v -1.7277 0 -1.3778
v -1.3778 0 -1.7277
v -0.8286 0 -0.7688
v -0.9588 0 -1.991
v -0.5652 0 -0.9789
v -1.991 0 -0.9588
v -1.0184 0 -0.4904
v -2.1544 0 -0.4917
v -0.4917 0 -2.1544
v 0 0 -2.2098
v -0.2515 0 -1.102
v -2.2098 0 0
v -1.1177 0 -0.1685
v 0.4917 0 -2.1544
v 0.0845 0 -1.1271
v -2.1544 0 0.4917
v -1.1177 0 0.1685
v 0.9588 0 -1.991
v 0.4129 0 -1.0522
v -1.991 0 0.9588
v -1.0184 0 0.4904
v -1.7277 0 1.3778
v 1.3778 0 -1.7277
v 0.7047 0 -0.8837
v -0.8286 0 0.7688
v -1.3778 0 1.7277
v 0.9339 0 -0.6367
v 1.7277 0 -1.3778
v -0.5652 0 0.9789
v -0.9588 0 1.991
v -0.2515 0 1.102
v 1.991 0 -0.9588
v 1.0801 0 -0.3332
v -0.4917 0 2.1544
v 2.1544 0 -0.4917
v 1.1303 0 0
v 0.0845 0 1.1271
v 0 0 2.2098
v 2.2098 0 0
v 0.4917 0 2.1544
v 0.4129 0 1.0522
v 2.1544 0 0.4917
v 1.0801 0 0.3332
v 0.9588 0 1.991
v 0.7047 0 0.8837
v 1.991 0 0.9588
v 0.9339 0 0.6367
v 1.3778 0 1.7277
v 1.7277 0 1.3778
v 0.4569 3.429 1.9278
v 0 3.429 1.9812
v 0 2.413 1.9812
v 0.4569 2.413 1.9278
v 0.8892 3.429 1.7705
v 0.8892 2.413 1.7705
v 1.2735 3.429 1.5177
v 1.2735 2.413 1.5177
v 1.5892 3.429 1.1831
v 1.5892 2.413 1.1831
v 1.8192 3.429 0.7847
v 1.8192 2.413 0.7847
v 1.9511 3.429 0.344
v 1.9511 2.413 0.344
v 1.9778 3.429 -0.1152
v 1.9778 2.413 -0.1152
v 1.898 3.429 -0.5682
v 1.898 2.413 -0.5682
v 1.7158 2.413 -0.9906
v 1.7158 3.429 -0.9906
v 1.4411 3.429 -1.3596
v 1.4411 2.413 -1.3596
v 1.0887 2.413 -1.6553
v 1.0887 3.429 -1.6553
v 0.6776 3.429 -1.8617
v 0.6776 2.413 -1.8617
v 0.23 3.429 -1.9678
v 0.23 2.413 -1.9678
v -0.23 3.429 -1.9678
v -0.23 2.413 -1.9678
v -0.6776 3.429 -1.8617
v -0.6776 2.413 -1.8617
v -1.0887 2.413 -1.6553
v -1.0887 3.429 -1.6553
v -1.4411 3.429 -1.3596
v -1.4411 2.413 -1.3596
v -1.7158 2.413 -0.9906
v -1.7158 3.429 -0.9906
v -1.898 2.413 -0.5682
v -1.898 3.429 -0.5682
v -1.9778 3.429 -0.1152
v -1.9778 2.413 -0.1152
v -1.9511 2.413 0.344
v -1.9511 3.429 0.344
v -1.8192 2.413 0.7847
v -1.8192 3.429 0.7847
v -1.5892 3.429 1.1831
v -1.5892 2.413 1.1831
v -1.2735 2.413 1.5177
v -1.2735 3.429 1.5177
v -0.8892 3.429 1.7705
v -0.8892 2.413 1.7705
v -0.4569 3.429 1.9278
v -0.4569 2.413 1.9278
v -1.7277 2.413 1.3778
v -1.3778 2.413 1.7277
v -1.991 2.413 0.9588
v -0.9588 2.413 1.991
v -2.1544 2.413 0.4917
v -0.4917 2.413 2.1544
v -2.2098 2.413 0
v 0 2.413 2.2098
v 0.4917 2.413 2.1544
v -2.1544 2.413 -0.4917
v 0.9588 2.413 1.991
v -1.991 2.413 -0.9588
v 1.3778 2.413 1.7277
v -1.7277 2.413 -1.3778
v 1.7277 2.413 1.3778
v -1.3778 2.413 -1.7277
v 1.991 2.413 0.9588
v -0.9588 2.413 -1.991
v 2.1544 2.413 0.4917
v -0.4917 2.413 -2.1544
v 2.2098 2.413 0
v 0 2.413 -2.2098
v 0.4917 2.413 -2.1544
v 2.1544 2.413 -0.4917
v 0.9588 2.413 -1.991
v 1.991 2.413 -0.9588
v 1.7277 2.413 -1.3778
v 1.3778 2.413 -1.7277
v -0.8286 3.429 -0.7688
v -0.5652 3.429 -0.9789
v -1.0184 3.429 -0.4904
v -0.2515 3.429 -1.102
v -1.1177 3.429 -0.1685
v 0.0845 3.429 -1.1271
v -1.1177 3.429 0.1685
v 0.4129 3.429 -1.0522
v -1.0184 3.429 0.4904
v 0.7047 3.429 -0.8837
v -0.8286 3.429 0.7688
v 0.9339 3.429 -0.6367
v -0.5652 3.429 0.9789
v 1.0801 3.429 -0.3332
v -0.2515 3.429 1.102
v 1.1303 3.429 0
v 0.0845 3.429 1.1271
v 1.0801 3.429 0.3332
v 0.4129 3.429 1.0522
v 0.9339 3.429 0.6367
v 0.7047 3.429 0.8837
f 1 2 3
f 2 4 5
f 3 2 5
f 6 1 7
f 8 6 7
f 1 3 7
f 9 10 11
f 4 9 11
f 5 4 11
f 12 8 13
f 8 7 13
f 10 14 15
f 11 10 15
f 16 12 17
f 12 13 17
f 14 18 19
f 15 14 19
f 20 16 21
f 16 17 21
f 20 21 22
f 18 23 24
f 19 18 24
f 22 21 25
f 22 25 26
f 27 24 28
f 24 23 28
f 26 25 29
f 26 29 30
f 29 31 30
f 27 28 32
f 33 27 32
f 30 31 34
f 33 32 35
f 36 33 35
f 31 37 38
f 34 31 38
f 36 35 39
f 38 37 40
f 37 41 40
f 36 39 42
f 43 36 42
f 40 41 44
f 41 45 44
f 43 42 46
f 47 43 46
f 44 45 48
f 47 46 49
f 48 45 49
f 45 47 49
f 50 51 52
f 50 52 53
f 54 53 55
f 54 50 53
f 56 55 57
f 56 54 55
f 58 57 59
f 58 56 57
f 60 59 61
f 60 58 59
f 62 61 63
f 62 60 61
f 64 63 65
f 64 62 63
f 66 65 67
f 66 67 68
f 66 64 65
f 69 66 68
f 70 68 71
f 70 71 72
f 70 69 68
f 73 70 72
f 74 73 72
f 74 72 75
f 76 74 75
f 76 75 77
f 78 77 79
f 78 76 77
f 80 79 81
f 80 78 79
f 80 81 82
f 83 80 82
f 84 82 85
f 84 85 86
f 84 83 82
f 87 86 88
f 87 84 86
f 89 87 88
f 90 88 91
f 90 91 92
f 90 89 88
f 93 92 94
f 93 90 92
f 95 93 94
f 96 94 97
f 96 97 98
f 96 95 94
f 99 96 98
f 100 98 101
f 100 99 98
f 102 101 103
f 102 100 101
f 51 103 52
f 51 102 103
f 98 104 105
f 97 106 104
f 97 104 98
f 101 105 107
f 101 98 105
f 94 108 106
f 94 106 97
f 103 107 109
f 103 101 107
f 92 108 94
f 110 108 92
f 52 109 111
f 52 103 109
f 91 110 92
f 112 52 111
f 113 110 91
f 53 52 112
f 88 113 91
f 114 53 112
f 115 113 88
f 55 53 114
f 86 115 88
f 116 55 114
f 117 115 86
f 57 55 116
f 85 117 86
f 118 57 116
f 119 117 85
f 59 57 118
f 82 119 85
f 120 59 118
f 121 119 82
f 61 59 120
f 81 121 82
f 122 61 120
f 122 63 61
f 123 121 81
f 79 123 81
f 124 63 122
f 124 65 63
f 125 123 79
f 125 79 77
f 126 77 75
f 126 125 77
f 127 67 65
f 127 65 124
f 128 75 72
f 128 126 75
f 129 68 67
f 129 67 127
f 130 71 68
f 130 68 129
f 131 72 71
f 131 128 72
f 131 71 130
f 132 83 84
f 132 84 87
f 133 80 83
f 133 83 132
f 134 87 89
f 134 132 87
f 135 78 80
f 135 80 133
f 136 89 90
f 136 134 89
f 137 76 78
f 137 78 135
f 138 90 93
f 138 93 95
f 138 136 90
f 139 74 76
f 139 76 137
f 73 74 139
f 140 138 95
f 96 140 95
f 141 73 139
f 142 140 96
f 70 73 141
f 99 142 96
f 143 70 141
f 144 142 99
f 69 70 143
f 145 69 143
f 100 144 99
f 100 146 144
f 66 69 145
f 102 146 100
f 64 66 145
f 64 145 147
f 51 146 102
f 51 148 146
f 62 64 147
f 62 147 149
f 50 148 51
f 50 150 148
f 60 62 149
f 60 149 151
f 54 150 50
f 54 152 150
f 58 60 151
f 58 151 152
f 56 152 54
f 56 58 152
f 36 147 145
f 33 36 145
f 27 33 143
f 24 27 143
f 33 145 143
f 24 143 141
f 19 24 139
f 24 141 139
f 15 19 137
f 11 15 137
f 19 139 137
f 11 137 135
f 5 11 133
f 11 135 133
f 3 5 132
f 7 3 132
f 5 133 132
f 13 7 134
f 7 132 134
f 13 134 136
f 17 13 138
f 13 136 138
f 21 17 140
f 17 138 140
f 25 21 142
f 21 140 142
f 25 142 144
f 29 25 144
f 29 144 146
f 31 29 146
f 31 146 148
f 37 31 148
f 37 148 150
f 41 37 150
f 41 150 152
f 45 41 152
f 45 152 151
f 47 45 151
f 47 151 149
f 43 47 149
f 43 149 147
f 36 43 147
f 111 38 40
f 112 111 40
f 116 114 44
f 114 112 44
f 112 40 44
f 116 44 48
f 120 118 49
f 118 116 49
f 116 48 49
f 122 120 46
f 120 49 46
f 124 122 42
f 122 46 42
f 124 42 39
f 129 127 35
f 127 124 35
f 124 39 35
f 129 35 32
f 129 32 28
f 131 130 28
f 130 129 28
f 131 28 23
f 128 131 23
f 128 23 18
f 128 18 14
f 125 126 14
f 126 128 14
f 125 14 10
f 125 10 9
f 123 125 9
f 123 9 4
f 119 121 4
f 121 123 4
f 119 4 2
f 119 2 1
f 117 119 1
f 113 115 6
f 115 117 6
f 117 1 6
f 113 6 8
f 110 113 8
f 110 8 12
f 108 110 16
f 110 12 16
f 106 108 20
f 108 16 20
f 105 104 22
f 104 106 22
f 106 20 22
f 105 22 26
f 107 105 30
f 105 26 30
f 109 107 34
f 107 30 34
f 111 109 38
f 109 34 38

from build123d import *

# Parameters (mm, degrees)
SKETCH1_R                 = 2.2098
BOSS_EXTRUDE1_DEPTH       = 3.429
SKETCH2_OUTSIDE_W         = 7.846
SKETCH2_OUTSIDE_H         = 7.846
SKETCH2_OUTSIDE_R         = 1.9812
CUT_EXTRUDE1_DEPTH        = 1.016
F_4_40_TAPPED_HOLE1_D     = 2.2606
F_4_40_TAPPED_HOLE1_DEPTH = 8.8646
F_4_40_TAPPED_HOLE1_TIP   = 0.679152758


with BuildPart() as part:
    # Sketch1 → Boss-Extrude1 (new body)
    with BuildSketch(Plane(origin=(0, 0, 0), x_dir=(1, 0, 0), z_dir=(0, 1, 0))):
        with Locations(Location((0, 0, 0), (0, 0, 270))):
            Circle(SKETCH1_R)
    extrude(amount=BOSS_EXTRUDE1_DEPTH)

    # Sketch2 outside → Cut-Extrude1 (cut)
    with BuildSketch(Plane(origin=(0, 3.429, 0), x_dir=(1, 0, 0), z_dir=(0, 1, 0))):
        Rectangle(SKETCH2_OUTSIDE_W, SKETCH2_OUTSIDE_H)
        with Locations(Location((0, 0, 0), (0, 0, 270))):
            Circle(SKETCH2_OUTSIDE_R, mode=Mode.SUBTRACT)
    extrude(amount=-CUT_EXTRUDE1_DEPTH, mode=Mode.SUBTRACT)

    # #4-40 Tapped Hole1
    with Locations(Plane(origin=(0, 0, 0), x_dir=(-1, 0, 0), z_dir=(0, -1, 0))):
        with Locations((0, 0)):
            Hole(F_4_40_TAPPED_HOLE1_D / 2, depth=F_4_40_TAPPED_HOLE1_DEPTH)
            with Locations((0, 0, -(F_4_40_TAPPED_HOLE1_DEPTH + F_4_40_TAPPED_HOLE1_TIP / 2))):  # 118° drill point
                Cone(0, F_4_40_TAPPED_HOLE1_D / 2, F_4_40_TAPPED_HOLE1_TIP, mode=Mode.SUBTRACT)


solid = part.part
